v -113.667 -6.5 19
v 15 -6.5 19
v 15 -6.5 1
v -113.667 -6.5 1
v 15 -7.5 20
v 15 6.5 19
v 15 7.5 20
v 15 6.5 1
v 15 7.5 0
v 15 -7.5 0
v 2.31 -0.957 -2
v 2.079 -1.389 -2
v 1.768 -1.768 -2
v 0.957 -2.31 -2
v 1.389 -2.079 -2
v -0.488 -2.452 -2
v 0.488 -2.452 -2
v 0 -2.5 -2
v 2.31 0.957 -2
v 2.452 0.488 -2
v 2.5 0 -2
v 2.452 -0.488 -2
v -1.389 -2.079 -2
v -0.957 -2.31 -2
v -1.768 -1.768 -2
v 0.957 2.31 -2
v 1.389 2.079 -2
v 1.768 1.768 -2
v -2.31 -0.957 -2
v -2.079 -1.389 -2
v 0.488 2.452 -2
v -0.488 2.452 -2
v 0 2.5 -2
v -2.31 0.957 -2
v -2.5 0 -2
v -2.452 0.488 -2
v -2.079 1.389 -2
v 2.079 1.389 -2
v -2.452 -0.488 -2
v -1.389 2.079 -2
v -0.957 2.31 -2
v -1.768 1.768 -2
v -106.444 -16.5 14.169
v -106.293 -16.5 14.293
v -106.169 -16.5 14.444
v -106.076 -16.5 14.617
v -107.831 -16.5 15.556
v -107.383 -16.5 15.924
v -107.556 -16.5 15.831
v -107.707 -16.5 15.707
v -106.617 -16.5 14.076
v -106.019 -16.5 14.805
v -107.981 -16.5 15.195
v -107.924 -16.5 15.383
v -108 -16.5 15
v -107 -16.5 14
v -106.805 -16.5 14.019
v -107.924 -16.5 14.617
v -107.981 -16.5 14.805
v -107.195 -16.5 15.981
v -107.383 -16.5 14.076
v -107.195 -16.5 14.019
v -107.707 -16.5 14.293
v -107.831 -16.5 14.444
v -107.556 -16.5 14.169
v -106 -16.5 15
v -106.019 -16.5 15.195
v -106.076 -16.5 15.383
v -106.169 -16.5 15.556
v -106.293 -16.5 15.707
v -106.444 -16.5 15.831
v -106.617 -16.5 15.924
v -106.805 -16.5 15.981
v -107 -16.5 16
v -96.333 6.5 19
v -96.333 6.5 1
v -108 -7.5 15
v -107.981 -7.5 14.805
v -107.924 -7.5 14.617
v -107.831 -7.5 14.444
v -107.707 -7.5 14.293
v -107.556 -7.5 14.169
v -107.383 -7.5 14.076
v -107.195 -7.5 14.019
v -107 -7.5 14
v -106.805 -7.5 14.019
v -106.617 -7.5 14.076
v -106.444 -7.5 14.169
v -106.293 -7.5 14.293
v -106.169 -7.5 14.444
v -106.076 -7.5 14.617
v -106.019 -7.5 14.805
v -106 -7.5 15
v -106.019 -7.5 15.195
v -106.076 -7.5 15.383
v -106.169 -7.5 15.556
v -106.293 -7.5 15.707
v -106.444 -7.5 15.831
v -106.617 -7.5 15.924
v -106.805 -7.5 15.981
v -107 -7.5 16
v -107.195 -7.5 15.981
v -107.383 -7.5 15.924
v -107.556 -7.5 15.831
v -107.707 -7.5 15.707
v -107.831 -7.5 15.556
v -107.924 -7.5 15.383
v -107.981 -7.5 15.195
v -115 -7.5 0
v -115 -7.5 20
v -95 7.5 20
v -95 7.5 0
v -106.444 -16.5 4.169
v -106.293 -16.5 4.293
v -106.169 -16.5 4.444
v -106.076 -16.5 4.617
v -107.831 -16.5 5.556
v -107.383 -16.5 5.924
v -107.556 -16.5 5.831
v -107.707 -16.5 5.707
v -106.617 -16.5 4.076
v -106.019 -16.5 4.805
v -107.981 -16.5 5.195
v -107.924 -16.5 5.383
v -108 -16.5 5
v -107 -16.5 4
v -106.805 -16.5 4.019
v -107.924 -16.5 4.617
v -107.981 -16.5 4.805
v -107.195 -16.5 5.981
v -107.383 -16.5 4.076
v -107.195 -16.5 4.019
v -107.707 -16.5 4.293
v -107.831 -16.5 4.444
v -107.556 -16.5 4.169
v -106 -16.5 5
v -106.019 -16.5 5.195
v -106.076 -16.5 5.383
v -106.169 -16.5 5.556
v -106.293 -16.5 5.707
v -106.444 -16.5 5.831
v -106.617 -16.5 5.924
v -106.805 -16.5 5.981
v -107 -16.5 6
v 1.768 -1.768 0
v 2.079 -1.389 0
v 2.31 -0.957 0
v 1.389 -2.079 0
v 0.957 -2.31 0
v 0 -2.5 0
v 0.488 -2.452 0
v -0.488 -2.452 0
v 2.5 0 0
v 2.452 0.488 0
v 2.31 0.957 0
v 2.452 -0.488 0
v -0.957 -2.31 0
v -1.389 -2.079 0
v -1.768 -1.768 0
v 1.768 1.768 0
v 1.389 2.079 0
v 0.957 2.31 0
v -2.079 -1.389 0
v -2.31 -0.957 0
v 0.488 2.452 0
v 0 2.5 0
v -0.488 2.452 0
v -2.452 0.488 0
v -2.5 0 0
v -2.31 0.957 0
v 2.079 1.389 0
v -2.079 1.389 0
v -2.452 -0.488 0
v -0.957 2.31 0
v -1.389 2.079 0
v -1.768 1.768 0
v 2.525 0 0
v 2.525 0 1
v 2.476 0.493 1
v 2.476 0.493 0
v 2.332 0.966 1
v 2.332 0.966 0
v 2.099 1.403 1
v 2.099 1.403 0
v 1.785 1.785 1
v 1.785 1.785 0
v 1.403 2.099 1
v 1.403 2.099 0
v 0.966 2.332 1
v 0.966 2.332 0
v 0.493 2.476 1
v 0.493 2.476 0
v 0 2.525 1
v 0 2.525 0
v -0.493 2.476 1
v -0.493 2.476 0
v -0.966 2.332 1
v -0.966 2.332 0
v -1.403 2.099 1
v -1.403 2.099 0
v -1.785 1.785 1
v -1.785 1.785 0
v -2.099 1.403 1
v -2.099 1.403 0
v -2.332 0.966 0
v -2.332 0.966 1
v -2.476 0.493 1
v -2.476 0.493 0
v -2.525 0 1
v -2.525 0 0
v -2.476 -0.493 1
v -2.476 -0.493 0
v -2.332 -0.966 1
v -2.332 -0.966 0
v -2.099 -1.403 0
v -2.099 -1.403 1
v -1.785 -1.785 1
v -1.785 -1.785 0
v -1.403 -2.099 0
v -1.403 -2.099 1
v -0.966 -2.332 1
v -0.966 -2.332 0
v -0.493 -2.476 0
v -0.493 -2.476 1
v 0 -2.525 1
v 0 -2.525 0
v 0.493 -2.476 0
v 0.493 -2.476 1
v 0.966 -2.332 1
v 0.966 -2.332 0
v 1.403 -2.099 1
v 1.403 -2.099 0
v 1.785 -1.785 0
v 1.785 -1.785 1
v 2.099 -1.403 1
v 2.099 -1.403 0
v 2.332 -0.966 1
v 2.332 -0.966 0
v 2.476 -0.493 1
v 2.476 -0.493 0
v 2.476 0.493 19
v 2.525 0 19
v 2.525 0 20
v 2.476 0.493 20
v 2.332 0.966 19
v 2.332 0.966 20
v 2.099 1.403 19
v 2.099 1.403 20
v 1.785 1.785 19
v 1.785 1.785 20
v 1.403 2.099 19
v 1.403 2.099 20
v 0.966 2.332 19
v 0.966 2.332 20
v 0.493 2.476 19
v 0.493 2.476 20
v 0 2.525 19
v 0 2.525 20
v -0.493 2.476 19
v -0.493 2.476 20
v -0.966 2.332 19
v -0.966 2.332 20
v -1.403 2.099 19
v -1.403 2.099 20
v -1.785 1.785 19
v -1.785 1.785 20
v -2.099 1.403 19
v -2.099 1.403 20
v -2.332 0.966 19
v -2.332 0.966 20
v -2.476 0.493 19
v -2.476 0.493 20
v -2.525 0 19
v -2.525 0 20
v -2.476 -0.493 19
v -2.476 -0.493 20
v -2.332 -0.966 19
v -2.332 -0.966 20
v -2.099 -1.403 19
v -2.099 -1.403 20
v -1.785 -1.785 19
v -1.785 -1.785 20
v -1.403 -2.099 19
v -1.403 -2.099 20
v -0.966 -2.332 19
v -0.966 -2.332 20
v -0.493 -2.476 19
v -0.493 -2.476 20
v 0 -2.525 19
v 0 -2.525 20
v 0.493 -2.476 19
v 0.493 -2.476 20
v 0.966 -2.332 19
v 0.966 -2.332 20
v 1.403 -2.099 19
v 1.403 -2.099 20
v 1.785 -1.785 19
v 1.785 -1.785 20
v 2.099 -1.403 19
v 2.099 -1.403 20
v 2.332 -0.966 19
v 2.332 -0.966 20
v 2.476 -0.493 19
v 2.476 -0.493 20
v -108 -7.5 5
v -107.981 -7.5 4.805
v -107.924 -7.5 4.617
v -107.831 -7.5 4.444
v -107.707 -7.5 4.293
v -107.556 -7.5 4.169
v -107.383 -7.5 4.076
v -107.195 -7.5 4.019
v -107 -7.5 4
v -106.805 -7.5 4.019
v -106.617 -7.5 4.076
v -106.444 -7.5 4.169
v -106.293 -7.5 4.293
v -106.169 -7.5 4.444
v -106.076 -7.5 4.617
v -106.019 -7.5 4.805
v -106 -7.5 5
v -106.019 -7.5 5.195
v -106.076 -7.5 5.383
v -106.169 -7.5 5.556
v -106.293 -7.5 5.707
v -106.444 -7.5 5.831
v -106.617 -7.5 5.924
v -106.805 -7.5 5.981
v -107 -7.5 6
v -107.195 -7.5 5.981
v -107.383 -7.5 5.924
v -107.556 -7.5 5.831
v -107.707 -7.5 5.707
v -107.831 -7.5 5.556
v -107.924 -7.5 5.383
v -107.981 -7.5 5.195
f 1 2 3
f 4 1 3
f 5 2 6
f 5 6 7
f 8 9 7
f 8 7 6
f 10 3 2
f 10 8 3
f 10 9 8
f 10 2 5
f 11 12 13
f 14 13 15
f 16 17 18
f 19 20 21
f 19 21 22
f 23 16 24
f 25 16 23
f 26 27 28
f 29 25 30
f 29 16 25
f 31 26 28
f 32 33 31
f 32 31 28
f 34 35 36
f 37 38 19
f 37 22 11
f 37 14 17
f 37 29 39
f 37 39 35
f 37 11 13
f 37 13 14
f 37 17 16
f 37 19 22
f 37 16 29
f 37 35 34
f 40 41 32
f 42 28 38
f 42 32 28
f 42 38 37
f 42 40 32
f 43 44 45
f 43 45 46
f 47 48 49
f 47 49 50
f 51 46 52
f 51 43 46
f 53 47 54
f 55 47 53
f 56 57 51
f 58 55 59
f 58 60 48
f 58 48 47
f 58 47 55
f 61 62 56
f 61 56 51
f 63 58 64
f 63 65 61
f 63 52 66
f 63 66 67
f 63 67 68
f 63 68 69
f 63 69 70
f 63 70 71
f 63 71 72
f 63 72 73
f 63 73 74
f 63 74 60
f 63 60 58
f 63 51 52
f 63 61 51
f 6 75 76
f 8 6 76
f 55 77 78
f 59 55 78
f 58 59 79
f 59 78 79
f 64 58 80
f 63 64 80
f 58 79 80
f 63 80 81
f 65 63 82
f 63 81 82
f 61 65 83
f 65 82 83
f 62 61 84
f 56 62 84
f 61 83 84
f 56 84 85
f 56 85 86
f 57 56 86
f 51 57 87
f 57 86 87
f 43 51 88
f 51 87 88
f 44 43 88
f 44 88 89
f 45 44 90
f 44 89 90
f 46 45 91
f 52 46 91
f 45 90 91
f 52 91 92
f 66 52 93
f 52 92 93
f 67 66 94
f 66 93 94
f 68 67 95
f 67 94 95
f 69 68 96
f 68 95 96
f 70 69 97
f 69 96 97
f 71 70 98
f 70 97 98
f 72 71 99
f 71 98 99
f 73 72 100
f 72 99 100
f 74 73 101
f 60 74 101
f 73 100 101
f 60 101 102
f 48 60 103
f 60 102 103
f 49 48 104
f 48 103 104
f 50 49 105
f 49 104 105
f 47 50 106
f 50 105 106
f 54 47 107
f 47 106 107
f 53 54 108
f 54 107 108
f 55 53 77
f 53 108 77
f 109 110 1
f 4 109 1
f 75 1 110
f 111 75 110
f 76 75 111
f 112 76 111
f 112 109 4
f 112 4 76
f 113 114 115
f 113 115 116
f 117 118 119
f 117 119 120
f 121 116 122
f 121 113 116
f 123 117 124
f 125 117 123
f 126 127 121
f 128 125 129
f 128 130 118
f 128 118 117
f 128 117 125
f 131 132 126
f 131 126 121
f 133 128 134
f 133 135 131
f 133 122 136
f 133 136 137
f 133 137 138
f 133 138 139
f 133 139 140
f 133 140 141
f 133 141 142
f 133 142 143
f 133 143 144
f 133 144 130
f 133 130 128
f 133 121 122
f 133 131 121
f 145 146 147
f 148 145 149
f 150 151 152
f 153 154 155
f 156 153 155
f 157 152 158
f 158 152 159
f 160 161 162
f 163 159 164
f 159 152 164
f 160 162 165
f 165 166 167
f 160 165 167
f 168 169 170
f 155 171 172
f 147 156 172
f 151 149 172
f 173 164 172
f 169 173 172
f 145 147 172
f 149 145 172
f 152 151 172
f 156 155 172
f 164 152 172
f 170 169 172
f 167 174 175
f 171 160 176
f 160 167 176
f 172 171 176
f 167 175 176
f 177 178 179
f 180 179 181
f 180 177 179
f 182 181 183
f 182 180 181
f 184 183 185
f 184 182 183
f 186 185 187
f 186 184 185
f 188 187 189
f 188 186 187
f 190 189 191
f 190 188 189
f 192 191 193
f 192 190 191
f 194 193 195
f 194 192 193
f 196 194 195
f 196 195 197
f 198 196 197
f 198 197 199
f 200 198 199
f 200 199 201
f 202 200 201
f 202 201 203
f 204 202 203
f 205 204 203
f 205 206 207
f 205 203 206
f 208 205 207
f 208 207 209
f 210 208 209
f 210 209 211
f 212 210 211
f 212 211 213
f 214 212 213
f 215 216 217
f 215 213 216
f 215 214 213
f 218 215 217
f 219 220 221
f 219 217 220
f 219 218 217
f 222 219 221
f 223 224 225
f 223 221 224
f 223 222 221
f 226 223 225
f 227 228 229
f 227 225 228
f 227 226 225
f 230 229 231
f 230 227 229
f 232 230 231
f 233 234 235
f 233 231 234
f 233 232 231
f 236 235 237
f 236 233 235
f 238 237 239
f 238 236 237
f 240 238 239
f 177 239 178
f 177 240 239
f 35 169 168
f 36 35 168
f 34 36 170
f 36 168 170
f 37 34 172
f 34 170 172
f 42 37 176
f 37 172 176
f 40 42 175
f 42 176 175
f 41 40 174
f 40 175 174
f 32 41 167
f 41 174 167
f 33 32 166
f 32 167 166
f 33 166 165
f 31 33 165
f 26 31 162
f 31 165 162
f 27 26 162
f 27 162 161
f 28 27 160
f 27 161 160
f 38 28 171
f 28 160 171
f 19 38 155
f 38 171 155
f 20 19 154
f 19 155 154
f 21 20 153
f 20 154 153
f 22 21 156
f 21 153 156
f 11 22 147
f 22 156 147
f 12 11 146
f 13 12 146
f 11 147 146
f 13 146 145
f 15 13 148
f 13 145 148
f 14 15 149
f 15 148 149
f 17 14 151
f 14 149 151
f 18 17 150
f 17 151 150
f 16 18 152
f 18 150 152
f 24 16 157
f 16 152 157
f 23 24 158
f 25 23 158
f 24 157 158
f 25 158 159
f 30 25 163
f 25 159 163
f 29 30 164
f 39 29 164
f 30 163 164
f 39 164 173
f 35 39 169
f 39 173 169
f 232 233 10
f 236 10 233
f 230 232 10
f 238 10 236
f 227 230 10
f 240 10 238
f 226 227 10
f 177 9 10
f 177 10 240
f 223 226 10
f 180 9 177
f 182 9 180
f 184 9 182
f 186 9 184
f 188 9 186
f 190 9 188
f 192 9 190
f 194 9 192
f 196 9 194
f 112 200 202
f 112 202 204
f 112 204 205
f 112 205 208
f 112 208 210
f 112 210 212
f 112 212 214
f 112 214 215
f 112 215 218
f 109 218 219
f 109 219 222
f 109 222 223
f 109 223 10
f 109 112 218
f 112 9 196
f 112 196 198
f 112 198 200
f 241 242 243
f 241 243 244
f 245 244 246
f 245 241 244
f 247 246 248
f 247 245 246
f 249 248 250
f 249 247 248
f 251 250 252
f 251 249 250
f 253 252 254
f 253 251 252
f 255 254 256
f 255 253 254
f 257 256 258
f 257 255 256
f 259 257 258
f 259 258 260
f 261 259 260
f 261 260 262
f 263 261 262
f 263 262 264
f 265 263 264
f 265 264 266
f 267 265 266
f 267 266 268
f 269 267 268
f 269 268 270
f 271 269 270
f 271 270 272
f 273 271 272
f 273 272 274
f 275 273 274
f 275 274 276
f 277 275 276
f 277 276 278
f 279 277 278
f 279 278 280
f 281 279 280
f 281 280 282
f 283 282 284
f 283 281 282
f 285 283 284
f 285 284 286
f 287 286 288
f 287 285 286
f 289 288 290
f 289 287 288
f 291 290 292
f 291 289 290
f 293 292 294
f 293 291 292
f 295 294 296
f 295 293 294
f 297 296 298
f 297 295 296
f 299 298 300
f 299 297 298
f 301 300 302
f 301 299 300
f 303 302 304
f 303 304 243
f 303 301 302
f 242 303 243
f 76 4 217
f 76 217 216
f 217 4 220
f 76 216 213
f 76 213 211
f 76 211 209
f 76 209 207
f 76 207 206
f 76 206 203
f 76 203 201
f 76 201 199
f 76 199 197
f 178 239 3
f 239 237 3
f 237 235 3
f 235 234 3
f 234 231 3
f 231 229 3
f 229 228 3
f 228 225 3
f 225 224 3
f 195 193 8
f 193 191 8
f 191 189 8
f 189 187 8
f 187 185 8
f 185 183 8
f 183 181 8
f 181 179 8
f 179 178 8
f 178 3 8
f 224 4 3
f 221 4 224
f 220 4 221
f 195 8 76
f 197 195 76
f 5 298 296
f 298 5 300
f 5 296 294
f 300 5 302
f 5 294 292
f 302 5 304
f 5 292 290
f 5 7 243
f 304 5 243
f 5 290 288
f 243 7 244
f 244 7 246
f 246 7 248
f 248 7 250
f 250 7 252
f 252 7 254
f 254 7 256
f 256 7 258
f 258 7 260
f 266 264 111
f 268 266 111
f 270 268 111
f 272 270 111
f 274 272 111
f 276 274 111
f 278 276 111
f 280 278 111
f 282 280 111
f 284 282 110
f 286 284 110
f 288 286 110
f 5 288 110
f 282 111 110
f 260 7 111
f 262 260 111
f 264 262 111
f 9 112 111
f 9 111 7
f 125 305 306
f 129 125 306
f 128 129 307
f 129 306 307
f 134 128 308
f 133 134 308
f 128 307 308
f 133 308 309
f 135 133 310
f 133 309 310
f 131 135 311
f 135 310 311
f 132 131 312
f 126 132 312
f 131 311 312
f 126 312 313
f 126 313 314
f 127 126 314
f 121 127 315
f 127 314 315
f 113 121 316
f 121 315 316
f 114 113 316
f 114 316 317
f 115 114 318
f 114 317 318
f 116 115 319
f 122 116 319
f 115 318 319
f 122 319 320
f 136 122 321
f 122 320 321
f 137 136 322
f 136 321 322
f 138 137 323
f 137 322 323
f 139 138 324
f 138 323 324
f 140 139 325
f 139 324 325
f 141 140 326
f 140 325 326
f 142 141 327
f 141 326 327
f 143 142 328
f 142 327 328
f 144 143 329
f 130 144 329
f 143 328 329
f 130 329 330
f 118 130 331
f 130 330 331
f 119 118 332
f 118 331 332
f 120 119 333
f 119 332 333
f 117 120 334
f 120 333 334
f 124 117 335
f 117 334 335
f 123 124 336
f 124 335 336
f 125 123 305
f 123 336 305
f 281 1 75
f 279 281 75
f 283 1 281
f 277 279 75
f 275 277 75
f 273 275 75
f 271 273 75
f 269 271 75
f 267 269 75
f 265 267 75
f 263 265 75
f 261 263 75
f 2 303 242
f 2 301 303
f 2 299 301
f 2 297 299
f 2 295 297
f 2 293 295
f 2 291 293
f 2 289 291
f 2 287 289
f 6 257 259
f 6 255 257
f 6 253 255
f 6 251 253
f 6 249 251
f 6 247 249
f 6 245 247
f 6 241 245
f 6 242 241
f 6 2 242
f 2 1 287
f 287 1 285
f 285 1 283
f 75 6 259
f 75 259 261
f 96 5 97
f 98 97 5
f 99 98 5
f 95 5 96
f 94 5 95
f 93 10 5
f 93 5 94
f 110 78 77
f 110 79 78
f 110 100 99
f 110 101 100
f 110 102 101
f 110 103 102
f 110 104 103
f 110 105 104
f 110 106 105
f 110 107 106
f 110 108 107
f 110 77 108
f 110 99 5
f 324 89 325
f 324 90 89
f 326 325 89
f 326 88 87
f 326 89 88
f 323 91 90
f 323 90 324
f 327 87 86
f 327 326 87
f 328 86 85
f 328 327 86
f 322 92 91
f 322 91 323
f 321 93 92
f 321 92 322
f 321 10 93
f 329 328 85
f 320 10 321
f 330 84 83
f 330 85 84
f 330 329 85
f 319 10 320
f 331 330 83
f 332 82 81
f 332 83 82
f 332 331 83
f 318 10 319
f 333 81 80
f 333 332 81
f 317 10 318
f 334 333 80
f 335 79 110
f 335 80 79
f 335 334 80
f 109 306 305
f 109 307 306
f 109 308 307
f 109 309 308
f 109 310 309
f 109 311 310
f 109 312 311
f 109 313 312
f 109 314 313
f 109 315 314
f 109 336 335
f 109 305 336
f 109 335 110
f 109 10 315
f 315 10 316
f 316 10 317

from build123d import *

# Parameters (mm, degrees)
ESQUISSE1_R             = 2.524565825
BOSS_EXTRU_1_DEPTH      = 20
ESQUISSE2_W             = 18
ESQUISSE2_H             = 13
ENL_V_MAT_EXTRU_1_DEPTH = 200
ESQUISSE4_R             = 1
BOSS_EXTRU_2_DEPTH      = 9
ESQUISSE5_R             = 2.5
BOSS_EXTRU_3_DEPTH      = 2


with BuildPart() as part:
    # Esquisse1 → Boss.-Extru.1 (new body)
    with BuildSketch(Plane.XY):
        Polygon((15, -7.5), (-115, -7.5), (-95, 7.5), (15, 7.5), align=None)
        Circle(ESQUISSE1_R, mode=Mode.SUBTRACT)
    extrude(amount=BOSS_EXTRU_1_DEPTH)

    # Esquisse2 → Enlèv. mat.-Extru.1 (cut)
    with BuildSketch(Plane(origin=(15, 0, 0), x_dir=(0, 0, -1), z_dir=(1, 0, 0))):
        with Locations((-10, 0)):
            Rectangle(ESQUISSE2_W, ESQUISSE2_H)
    extrude(amount=-ENL_V_MAT_EXTRU_1_DEPTH, mode=Mode.SUBTRACT)

    # Esquisse4 → Boss.-Extru.2 (add)
    with BuildSketch(Plane.XZ.offset(7.5)):
        with Locations(Location((-107, 15, 0), (0, 0, 180))):
            Circle(ESQUISSE4_R)
        with Locations(Location((-107, 5, 0), (0, 0, 180))):
            Circle(ESQUISSE4_R)
    extrude(amount=BOSS_EXTRU_2_DEPTH)


with BuildPart() as body_2:
    # Esquisse5 → Boss.-Extru.3 (new body)
    with BuildSketch(Plane(origin=(0, 0, 0), x_dir=(-1, 0, 0), z_dir=(0, 0, -1))):
        Circle(ESQUISSE5_R)
    extrude(amount=BOSS_EXTRU_3_DEPTH)


solid = Compound([part.part, body_2.part])
